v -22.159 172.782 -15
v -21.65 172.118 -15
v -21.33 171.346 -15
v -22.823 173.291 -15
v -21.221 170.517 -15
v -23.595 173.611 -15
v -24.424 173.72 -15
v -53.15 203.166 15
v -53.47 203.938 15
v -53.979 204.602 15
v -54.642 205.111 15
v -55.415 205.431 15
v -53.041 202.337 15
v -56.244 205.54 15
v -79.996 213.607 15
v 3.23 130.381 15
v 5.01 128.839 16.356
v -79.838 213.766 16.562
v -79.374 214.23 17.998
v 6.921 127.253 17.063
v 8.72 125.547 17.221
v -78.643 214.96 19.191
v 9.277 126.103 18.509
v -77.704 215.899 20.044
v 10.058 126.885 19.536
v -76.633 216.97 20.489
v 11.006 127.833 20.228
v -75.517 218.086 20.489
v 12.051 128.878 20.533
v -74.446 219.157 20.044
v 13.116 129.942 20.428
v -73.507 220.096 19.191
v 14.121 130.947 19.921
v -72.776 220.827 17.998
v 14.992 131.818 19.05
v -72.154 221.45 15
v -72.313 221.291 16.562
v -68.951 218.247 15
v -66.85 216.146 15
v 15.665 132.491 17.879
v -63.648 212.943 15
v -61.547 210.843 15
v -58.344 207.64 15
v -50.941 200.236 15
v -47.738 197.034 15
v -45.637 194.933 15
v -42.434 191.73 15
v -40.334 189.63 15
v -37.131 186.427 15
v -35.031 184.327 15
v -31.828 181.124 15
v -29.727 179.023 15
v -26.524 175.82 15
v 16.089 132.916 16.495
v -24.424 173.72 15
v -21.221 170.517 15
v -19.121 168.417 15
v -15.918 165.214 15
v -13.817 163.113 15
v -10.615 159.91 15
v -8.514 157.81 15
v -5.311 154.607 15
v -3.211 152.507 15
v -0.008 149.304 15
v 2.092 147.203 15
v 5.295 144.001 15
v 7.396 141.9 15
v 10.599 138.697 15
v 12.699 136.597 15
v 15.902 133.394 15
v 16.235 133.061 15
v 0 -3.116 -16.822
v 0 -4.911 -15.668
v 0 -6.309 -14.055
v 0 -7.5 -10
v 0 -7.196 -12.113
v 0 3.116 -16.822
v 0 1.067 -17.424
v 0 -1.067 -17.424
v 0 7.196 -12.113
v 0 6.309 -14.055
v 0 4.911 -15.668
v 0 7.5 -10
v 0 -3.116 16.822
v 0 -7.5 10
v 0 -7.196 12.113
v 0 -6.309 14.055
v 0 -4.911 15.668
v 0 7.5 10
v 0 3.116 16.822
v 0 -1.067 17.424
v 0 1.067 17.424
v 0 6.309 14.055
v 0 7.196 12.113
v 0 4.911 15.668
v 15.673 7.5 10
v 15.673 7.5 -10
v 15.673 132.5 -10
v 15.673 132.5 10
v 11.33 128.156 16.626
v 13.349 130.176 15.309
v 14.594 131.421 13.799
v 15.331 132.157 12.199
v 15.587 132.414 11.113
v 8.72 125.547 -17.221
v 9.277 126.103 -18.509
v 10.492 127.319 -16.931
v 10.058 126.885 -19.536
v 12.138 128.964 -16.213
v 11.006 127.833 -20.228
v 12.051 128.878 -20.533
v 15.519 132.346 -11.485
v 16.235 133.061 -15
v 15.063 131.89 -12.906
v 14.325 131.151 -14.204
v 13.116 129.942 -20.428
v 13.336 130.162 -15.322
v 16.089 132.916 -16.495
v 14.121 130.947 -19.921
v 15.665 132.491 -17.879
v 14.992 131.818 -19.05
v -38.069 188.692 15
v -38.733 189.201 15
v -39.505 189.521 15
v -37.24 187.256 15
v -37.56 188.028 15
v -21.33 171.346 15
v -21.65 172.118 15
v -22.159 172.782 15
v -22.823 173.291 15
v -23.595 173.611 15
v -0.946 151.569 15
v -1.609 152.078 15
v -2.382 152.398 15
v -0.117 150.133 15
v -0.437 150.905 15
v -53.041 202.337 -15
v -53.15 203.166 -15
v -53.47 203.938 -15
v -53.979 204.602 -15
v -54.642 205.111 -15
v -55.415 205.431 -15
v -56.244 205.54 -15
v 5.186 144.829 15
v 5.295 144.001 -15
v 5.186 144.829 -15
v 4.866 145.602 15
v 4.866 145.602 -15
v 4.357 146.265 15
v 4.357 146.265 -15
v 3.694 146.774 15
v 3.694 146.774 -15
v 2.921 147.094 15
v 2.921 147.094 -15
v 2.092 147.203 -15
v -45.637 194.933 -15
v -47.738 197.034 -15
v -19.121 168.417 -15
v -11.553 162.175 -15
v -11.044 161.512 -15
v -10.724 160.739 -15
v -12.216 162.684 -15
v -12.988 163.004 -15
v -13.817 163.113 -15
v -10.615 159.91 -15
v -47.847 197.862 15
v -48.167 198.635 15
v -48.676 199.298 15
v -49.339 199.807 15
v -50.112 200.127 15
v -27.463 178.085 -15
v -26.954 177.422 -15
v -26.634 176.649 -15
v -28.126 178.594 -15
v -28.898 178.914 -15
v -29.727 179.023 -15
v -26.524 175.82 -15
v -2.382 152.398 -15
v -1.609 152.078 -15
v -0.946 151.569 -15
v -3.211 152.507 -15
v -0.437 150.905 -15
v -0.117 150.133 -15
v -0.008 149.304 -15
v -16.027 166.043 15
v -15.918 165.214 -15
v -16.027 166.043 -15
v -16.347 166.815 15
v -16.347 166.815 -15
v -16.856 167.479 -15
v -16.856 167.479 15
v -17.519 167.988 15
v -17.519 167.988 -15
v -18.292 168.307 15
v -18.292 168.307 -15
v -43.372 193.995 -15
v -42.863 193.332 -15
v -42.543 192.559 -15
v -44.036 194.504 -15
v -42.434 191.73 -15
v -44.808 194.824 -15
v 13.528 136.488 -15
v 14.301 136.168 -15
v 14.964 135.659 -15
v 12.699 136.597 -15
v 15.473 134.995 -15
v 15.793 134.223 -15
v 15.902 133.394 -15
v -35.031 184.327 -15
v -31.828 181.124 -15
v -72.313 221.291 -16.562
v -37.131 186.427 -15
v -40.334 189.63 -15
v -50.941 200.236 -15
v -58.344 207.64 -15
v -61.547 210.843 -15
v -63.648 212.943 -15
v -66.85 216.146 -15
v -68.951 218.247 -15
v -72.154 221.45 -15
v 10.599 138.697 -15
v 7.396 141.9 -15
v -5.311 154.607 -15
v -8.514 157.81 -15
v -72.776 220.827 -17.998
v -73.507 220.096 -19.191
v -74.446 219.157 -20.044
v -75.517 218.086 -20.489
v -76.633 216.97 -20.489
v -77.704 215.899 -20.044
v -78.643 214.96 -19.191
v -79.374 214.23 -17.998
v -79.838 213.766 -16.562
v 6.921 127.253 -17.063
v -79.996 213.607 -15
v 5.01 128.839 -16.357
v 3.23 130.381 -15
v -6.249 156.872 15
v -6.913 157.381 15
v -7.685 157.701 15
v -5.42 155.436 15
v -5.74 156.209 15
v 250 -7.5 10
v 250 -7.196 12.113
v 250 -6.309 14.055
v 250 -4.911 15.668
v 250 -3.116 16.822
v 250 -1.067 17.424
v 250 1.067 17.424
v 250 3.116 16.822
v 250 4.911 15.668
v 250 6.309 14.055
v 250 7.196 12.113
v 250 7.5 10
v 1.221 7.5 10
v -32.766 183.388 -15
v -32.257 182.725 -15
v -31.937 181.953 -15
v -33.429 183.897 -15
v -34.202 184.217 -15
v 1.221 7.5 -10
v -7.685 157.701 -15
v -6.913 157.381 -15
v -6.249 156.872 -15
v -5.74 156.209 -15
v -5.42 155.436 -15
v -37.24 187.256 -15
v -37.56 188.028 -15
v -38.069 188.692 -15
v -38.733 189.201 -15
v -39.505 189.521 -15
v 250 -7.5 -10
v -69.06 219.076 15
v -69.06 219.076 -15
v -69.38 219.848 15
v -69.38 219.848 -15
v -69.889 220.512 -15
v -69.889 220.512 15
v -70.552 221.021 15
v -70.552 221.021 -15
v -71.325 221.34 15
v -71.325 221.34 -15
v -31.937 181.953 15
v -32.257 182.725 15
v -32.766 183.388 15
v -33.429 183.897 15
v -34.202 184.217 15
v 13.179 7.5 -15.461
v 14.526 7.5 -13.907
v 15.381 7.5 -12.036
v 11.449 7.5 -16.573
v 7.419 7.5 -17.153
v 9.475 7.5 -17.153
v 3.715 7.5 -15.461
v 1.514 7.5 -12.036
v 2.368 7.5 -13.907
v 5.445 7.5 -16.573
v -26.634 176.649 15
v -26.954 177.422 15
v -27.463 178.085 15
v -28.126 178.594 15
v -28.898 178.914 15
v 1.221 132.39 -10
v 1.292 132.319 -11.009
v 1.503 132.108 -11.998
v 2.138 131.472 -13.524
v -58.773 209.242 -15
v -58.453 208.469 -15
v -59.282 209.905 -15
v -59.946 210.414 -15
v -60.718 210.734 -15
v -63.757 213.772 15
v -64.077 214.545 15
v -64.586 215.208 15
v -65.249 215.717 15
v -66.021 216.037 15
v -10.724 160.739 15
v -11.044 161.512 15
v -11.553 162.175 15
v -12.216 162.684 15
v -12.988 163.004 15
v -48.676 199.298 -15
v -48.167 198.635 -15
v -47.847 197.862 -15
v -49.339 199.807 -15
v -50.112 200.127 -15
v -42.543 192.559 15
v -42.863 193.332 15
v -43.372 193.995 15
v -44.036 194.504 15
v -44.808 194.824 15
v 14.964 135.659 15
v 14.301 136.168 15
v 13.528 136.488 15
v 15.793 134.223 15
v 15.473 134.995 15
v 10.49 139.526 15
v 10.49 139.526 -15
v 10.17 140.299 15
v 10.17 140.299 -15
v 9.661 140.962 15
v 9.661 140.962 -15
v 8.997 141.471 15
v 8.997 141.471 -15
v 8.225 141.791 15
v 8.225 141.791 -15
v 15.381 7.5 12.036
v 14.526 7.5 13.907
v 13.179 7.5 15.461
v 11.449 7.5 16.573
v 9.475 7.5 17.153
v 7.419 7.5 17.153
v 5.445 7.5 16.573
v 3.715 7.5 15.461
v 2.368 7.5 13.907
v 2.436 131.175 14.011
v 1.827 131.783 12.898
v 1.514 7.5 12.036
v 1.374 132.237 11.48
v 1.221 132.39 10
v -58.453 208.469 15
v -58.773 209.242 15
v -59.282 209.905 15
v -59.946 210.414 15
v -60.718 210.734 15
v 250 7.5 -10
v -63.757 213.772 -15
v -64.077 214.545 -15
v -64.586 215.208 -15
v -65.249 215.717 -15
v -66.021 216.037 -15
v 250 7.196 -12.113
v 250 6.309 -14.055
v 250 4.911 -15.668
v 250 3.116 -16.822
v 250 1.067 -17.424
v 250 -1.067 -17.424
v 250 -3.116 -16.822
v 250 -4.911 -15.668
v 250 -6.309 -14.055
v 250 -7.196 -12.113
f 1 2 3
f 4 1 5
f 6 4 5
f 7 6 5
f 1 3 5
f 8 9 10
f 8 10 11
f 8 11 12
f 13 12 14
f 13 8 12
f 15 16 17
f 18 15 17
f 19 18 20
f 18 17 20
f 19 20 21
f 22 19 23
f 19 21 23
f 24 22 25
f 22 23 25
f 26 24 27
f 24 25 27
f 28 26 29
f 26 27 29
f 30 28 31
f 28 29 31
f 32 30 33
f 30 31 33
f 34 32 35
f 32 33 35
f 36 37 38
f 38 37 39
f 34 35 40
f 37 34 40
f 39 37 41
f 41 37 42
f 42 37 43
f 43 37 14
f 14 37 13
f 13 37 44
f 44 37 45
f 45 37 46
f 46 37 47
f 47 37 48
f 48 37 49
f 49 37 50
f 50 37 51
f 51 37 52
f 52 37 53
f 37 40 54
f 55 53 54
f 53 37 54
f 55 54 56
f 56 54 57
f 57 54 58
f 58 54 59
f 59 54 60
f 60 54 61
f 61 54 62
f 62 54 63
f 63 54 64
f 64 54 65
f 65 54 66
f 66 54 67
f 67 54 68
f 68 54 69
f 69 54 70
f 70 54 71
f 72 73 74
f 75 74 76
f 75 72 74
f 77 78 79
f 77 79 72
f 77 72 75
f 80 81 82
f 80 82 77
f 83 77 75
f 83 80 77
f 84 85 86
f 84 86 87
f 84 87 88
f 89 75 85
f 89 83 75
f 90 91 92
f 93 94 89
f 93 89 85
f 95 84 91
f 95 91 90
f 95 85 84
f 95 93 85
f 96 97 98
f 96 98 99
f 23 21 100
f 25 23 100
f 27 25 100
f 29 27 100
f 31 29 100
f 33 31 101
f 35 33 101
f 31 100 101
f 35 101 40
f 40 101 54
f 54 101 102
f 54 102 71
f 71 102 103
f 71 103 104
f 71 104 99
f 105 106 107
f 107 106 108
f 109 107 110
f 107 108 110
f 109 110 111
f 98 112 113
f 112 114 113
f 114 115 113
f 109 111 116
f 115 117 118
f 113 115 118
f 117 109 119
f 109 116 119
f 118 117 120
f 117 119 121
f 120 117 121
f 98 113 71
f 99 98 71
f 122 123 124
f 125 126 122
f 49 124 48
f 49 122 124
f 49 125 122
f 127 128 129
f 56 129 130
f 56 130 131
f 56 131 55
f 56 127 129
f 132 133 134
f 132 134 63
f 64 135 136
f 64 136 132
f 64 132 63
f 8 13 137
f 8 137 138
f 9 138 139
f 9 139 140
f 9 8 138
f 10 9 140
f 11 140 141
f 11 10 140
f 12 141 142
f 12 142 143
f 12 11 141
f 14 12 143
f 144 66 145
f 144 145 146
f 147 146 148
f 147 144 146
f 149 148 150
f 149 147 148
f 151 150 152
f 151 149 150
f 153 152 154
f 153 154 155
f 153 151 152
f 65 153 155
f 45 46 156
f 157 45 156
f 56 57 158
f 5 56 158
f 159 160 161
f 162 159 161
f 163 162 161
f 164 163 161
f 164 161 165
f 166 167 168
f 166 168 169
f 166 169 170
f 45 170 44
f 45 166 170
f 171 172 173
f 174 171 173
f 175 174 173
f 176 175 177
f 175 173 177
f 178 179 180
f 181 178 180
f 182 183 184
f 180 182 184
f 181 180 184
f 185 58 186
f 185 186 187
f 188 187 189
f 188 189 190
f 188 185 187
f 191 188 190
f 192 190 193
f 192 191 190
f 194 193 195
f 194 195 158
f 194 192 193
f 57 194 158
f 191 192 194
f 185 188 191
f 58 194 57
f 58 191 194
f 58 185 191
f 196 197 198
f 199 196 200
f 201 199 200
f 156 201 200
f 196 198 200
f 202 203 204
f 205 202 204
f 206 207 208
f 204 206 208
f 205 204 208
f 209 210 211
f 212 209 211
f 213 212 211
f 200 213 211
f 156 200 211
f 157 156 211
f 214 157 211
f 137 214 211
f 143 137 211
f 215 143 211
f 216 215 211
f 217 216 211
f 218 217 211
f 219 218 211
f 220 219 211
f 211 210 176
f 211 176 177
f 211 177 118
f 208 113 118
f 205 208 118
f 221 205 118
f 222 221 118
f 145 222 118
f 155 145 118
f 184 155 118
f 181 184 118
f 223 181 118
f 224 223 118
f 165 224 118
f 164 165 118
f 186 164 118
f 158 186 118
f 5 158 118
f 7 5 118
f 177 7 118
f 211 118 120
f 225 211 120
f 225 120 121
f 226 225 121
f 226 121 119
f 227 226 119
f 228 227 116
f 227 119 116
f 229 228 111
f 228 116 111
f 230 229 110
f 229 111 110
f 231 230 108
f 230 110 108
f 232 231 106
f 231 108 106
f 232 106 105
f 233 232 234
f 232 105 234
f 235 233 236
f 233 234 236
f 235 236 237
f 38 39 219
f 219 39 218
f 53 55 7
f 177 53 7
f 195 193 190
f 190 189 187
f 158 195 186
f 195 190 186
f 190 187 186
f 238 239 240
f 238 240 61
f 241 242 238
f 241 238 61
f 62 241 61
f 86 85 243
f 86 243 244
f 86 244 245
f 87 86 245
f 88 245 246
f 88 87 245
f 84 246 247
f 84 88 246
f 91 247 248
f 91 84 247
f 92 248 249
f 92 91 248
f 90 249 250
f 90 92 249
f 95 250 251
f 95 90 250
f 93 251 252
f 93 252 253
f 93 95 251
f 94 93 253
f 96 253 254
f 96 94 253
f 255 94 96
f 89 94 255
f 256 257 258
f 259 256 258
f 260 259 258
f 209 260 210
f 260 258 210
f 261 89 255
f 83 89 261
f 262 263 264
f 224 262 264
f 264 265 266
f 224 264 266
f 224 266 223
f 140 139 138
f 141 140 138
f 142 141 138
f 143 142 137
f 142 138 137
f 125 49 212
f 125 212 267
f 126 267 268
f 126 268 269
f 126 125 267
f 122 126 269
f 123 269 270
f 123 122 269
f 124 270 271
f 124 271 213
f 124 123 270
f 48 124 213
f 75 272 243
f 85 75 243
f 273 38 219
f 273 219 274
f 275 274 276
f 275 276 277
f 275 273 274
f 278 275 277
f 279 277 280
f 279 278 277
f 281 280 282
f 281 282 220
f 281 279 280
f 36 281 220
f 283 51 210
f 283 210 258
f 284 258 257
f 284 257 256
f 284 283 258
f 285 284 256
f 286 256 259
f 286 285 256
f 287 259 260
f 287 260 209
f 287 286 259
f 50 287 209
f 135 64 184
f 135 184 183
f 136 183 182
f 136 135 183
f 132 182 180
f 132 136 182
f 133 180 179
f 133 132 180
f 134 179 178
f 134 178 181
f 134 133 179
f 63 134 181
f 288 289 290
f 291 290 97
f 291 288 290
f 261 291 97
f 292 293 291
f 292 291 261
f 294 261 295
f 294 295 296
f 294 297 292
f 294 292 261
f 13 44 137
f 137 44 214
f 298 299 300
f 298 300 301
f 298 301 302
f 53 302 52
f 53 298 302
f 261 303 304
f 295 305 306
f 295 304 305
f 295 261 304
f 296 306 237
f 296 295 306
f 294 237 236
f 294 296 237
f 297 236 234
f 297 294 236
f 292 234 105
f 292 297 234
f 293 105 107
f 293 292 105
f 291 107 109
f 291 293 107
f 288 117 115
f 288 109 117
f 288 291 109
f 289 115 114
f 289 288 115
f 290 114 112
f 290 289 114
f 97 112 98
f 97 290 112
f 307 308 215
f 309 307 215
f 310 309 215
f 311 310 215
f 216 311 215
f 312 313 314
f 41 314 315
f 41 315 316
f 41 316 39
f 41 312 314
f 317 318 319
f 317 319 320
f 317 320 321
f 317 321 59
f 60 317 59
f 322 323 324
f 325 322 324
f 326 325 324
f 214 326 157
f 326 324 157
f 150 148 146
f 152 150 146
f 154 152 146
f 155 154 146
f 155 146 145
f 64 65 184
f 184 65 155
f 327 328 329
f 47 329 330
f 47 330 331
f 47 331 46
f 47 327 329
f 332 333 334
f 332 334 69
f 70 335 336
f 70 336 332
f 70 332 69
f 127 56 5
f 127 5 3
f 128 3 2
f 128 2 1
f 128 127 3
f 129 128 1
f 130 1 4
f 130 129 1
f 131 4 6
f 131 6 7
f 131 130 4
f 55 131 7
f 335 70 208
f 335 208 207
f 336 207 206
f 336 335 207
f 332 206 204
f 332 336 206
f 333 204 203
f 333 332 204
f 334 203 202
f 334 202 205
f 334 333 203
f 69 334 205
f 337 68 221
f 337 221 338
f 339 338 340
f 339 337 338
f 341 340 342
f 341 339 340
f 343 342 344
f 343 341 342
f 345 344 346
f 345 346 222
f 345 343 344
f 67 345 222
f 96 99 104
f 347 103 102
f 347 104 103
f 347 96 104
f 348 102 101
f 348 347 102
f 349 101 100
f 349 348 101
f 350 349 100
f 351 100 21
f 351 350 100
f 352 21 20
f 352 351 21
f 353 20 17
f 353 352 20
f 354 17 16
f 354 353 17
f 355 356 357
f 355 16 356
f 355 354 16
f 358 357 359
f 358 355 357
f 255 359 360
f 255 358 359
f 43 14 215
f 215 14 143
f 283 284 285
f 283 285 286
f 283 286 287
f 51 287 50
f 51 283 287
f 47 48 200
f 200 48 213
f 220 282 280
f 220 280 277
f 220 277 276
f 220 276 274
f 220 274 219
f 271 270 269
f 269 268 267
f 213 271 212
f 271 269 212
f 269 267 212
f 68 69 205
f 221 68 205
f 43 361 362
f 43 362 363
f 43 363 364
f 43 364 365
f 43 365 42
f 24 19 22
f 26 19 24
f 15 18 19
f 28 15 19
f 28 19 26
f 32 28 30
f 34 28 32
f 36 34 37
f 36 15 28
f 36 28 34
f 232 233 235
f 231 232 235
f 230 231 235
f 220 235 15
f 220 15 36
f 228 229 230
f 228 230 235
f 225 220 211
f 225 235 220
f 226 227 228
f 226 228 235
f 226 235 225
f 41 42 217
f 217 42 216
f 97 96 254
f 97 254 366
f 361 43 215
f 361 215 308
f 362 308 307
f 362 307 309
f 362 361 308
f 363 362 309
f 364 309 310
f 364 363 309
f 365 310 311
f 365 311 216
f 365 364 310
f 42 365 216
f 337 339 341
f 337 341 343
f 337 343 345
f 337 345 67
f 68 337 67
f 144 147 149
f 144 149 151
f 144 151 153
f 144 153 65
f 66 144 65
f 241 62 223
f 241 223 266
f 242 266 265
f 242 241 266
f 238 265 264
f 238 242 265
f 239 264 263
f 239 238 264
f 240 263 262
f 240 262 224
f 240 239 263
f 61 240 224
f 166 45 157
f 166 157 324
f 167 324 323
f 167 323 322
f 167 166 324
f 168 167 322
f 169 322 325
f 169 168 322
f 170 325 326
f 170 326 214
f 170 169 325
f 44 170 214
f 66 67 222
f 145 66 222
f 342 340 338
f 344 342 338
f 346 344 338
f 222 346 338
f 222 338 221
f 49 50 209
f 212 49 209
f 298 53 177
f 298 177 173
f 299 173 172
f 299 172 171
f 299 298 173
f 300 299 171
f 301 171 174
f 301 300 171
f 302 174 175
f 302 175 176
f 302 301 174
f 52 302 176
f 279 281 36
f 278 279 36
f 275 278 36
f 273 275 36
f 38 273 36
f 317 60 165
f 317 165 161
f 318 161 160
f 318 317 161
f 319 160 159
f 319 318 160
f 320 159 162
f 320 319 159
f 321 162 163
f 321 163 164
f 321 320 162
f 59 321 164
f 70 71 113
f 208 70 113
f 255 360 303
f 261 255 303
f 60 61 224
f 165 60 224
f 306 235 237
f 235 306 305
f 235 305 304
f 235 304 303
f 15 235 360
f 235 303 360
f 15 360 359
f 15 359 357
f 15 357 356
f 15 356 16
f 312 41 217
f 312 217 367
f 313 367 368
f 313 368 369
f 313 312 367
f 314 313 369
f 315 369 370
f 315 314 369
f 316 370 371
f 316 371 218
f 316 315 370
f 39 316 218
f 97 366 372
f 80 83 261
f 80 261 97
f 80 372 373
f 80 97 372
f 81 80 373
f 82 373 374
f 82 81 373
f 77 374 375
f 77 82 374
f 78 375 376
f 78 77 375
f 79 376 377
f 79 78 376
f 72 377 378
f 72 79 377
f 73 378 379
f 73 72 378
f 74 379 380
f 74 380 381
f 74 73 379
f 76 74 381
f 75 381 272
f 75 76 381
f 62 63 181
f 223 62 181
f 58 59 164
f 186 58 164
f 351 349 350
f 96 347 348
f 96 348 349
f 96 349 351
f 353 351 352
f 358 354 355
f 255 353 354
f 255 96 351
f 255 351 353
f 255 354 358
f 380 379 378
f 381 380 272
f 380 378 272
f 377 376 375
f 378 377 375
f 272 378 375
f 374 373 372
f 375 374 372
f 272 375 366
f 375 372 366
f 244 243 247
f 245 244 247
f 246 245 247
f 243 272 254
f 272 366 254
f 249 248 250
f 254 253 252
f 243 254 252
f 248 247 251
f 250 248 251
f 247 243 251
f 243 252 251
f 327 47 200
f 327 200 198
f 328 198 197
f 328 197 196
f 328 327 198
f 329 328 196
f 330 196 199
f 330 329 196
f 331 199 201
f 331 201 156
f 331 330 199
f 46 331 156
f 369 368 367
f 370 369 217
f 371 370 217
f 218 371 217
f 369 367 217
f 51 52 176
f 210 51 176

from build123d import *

# Parameters (mm, degrees)
BOSS_EXTRUDE1_DEPTH = 250
BOSS_EXTRUDE6_DEPTH = 125
BOSS_EXTRUDE7_DEPTH = 125
BOSS_EXTRUDE8_DEPTH = 30


with BuildPart() as part:
    # Sketch1 → Boss-Extrude1 (new body)
    with BuildSketch(Plane(origin=(0, 0, 0), x_dir=(0, 0, -1), z_dir=(1, 0, 0))):
        with BuildLine():
            Line((-10, 7.5), (10, 7.5))
            ThreePointArc((10, 7.5), (17.5, 0), (10, -7.5))
            Line((10, -7.5), (-10, -7.5))
            ThreePointArc((-10, -7.5), (-17.5, 0), (-10, 7.5))
        make_face()
    extrude(amount=BOSS_EXTRUDE1_DEPTH)

    # Sketch11 → Boss-Extrude6 (add)
    with BuildSketch(Plane(origin=(0, 7.5, 0), x_dir=(1, 0, 0), z_dir=(0, 1, 0))):
        with BuildLine():
            Line((1.220843579, -10), (1.220843579, 10))
            ThreePointArc((1.220843579, 10), (8.447072594, 17.226229015), (15.673301609, 10))
            Line((15.673301609, 10), (15.673301609, -10))
            ThreePointArc((15.673301609, -10), (8.447072594, -17.226229015), (1.220843579, -10))
        make_face()
    extrude(amount=BOSS_EXTRUDE6_DEPTH)

    # Sketch12 → Boss-Extrude7 (add)
    with BuildSketch(Plane(origin=(-58.413349195, 58.413349195, 0), x_dir=(-0.7071067811865476, -0.7071067811865476, 0), z_dir=(0.7071067811865476, -0.7071067811865476, 0))):
        with BuildLine():
            Line((-105.56811993, -15), (-105.56811993, 15))
            ThreePointArc((-105.56811993, 15), (-100.022563681, 20.545556249), (-94.477007433, 15))
            Line((-94.477007433, 15), (-94.477007433, -15))
            ThreePointArc((-94.477007433, -15), (-100.022563681, -20.545556249), (-105.56811993, -15))
        make_face()
    extrude(amount=-BOSS_EXTRUDE7_DEPTH)

    # Sketch13 → Boss-Extrude8 (add)
    with BuildSketch(Plane(origin=(0, 0, 15), x_dir=(0.7071067811865476, -0.7071067811865476, 0), z_dir=(0, 0, 1))):
        with BuildLine():
            Line((-207.608950656, 105.56811993), (-203.079358094, 105.56811993))
            ThreePointArc((-203.079358094, 105.56811993), (-205.344154375, 106.506229266), (-207.608950656, 105.56811993))
        make_face()
        with BuildLine():
            Line((-200.108950656, 105.56811993), (-195.579358094, 105.56811993))
            ThreePointArc((-195.579358094, 105.56811993), (-197.844154375, 106.506229266), (-200.108950656, 105.56811993))
        make_face()
        with BuildLine():
            Line((-192.608950656, 105.56811993), (-188.079358094, 105.56811993))
            ThreePointArc((-188.079358094, 105.56811993), (-190.344154375, 106.506229266), (-192.608950656, 105.56811993))
        make_face()
        with BuildLine():
            Line((-185.108950656, 105.56811993), (-180.579358094, 105.56811993))
            ThreePointArc((-180.579358094, 105.56811993), (-182.844154375, 106.506229266), (-185.108950656, 105.56811993))
        make_face()
        with BuildLine():
            Line((-177.608950656, 105.56811993), (-173.079358094, 105.56811993))
            ThreePointArc((-173.079358094, 105.56811993), (-175.344154375, 106.506229266), (-177.608950656, 105.56811993))
        make_face()
        with BuildLine():
            Line((-170.108950656, 105.56811993), (-165.579358094, 105.56811993))
            ThreePointArc((-165.579358094, 105.56811993), (-167.844154375, 106.506229266), (-170.108950656, 105.56811993))
        make_face()
        with BuildLine():
            Line((-162.608950656, 105.56811993), (-158.079358094, 105.56811993))
            ThreePointArc((-158.079358094, 105.56811993), (-160.344154375, 106.506229266), (-162.608950656, 105.56811993))
        make_face()
        with BuildLine():
            Line((-155.108950656, 105.56811993), (-150.579358094, 105.56811993))
            ThreePointArc((-150.579358094, 105.56811993), (-152.844154375, 106.506229266), (-155.108950656, 105.56811993))
        make_face()
        with BuildLine():
            Line((-147.608950656, 105.56811993), (-143.079358094, 105.56811993))
            ThreePointArc((-143.079358094, 105.56811993), (-145.344154375, 106.506229266), (-147.608950656, 105.56811993))
        make_face()
        with BuildLine():
            Line((-140.108950656, 105.56811993), (-135.579358094, 105.56811993))
            ThreePointArc((-135.579358094, 105.56811993), (-137.844154375, 106.506229266), (-140.108950656, 105.56811993))
        make_face()
        with BuildLine():
            Line((-132.608950656, 105.56811993), (-128.079358094, 105.56811993))
            ThreePointArc((-128.079358094, 105.56811993), (-130.344154375, 106.506229266), (-132.608950656, 105.56811993))
        make_face()
        with BuildLine():
            Line((-125.108950656, 105.56811993), (-120.579358094, 105.56811993))
            ThreePointArc((-120.579358094, 105.56811993), (-122.844154375, 106.506229266), (-125.108950656, 105.56811993))
        make_face()
        with BuildLine():
            Line((-117.608950656, 105.56811993), (-113.079358094, 105.56811993))
            ThreePointArc((-113.079358094, 105.56811993), (-115.344154375, 106.506229266), (-117.608950656, 105.56811993))
        make_face()
        with BuildLine():
            Line((-110.108950656, 105.56811993), (-105.579358094, 105.56811993))
            ThreePointArc((-105.579358094, 105.56811993), (-107.844154375, 106.506229266), (-110.108950656, 105.56811993))
        make_face()
        with BuildLine():
            Line((-102.608950656, 105.56811993), (-98.079358094, 105.56811993))
            ThreePointArc((-98.079358094, 105.56811993), (-100.344154375, 106.506229266), (-102.608950656, 105.56811993))
        make_face()
        with BuildLine():
            Line((-95.108950656, 105.56811993), (-90.579358094, 105.56811993))
            ThreePointArc((-90.579358094, 105.56811993), (-92.844154375, 106.506229266), (-95.108950656, 105.56811993))
        make_face()
        with BuildLine():
            Line((-87.608950656, 105.56811993), (-83.079358094, 105.56811993))
            ThreePointArc((-83.079358094, 105.56811993), (-85.344154375, 106.506229266), (-87.608950656, 105.56811993))
        make_face()
    extrude(amount=-BOSS_EXTRUDE8_DEPTH)


solid = part.part
